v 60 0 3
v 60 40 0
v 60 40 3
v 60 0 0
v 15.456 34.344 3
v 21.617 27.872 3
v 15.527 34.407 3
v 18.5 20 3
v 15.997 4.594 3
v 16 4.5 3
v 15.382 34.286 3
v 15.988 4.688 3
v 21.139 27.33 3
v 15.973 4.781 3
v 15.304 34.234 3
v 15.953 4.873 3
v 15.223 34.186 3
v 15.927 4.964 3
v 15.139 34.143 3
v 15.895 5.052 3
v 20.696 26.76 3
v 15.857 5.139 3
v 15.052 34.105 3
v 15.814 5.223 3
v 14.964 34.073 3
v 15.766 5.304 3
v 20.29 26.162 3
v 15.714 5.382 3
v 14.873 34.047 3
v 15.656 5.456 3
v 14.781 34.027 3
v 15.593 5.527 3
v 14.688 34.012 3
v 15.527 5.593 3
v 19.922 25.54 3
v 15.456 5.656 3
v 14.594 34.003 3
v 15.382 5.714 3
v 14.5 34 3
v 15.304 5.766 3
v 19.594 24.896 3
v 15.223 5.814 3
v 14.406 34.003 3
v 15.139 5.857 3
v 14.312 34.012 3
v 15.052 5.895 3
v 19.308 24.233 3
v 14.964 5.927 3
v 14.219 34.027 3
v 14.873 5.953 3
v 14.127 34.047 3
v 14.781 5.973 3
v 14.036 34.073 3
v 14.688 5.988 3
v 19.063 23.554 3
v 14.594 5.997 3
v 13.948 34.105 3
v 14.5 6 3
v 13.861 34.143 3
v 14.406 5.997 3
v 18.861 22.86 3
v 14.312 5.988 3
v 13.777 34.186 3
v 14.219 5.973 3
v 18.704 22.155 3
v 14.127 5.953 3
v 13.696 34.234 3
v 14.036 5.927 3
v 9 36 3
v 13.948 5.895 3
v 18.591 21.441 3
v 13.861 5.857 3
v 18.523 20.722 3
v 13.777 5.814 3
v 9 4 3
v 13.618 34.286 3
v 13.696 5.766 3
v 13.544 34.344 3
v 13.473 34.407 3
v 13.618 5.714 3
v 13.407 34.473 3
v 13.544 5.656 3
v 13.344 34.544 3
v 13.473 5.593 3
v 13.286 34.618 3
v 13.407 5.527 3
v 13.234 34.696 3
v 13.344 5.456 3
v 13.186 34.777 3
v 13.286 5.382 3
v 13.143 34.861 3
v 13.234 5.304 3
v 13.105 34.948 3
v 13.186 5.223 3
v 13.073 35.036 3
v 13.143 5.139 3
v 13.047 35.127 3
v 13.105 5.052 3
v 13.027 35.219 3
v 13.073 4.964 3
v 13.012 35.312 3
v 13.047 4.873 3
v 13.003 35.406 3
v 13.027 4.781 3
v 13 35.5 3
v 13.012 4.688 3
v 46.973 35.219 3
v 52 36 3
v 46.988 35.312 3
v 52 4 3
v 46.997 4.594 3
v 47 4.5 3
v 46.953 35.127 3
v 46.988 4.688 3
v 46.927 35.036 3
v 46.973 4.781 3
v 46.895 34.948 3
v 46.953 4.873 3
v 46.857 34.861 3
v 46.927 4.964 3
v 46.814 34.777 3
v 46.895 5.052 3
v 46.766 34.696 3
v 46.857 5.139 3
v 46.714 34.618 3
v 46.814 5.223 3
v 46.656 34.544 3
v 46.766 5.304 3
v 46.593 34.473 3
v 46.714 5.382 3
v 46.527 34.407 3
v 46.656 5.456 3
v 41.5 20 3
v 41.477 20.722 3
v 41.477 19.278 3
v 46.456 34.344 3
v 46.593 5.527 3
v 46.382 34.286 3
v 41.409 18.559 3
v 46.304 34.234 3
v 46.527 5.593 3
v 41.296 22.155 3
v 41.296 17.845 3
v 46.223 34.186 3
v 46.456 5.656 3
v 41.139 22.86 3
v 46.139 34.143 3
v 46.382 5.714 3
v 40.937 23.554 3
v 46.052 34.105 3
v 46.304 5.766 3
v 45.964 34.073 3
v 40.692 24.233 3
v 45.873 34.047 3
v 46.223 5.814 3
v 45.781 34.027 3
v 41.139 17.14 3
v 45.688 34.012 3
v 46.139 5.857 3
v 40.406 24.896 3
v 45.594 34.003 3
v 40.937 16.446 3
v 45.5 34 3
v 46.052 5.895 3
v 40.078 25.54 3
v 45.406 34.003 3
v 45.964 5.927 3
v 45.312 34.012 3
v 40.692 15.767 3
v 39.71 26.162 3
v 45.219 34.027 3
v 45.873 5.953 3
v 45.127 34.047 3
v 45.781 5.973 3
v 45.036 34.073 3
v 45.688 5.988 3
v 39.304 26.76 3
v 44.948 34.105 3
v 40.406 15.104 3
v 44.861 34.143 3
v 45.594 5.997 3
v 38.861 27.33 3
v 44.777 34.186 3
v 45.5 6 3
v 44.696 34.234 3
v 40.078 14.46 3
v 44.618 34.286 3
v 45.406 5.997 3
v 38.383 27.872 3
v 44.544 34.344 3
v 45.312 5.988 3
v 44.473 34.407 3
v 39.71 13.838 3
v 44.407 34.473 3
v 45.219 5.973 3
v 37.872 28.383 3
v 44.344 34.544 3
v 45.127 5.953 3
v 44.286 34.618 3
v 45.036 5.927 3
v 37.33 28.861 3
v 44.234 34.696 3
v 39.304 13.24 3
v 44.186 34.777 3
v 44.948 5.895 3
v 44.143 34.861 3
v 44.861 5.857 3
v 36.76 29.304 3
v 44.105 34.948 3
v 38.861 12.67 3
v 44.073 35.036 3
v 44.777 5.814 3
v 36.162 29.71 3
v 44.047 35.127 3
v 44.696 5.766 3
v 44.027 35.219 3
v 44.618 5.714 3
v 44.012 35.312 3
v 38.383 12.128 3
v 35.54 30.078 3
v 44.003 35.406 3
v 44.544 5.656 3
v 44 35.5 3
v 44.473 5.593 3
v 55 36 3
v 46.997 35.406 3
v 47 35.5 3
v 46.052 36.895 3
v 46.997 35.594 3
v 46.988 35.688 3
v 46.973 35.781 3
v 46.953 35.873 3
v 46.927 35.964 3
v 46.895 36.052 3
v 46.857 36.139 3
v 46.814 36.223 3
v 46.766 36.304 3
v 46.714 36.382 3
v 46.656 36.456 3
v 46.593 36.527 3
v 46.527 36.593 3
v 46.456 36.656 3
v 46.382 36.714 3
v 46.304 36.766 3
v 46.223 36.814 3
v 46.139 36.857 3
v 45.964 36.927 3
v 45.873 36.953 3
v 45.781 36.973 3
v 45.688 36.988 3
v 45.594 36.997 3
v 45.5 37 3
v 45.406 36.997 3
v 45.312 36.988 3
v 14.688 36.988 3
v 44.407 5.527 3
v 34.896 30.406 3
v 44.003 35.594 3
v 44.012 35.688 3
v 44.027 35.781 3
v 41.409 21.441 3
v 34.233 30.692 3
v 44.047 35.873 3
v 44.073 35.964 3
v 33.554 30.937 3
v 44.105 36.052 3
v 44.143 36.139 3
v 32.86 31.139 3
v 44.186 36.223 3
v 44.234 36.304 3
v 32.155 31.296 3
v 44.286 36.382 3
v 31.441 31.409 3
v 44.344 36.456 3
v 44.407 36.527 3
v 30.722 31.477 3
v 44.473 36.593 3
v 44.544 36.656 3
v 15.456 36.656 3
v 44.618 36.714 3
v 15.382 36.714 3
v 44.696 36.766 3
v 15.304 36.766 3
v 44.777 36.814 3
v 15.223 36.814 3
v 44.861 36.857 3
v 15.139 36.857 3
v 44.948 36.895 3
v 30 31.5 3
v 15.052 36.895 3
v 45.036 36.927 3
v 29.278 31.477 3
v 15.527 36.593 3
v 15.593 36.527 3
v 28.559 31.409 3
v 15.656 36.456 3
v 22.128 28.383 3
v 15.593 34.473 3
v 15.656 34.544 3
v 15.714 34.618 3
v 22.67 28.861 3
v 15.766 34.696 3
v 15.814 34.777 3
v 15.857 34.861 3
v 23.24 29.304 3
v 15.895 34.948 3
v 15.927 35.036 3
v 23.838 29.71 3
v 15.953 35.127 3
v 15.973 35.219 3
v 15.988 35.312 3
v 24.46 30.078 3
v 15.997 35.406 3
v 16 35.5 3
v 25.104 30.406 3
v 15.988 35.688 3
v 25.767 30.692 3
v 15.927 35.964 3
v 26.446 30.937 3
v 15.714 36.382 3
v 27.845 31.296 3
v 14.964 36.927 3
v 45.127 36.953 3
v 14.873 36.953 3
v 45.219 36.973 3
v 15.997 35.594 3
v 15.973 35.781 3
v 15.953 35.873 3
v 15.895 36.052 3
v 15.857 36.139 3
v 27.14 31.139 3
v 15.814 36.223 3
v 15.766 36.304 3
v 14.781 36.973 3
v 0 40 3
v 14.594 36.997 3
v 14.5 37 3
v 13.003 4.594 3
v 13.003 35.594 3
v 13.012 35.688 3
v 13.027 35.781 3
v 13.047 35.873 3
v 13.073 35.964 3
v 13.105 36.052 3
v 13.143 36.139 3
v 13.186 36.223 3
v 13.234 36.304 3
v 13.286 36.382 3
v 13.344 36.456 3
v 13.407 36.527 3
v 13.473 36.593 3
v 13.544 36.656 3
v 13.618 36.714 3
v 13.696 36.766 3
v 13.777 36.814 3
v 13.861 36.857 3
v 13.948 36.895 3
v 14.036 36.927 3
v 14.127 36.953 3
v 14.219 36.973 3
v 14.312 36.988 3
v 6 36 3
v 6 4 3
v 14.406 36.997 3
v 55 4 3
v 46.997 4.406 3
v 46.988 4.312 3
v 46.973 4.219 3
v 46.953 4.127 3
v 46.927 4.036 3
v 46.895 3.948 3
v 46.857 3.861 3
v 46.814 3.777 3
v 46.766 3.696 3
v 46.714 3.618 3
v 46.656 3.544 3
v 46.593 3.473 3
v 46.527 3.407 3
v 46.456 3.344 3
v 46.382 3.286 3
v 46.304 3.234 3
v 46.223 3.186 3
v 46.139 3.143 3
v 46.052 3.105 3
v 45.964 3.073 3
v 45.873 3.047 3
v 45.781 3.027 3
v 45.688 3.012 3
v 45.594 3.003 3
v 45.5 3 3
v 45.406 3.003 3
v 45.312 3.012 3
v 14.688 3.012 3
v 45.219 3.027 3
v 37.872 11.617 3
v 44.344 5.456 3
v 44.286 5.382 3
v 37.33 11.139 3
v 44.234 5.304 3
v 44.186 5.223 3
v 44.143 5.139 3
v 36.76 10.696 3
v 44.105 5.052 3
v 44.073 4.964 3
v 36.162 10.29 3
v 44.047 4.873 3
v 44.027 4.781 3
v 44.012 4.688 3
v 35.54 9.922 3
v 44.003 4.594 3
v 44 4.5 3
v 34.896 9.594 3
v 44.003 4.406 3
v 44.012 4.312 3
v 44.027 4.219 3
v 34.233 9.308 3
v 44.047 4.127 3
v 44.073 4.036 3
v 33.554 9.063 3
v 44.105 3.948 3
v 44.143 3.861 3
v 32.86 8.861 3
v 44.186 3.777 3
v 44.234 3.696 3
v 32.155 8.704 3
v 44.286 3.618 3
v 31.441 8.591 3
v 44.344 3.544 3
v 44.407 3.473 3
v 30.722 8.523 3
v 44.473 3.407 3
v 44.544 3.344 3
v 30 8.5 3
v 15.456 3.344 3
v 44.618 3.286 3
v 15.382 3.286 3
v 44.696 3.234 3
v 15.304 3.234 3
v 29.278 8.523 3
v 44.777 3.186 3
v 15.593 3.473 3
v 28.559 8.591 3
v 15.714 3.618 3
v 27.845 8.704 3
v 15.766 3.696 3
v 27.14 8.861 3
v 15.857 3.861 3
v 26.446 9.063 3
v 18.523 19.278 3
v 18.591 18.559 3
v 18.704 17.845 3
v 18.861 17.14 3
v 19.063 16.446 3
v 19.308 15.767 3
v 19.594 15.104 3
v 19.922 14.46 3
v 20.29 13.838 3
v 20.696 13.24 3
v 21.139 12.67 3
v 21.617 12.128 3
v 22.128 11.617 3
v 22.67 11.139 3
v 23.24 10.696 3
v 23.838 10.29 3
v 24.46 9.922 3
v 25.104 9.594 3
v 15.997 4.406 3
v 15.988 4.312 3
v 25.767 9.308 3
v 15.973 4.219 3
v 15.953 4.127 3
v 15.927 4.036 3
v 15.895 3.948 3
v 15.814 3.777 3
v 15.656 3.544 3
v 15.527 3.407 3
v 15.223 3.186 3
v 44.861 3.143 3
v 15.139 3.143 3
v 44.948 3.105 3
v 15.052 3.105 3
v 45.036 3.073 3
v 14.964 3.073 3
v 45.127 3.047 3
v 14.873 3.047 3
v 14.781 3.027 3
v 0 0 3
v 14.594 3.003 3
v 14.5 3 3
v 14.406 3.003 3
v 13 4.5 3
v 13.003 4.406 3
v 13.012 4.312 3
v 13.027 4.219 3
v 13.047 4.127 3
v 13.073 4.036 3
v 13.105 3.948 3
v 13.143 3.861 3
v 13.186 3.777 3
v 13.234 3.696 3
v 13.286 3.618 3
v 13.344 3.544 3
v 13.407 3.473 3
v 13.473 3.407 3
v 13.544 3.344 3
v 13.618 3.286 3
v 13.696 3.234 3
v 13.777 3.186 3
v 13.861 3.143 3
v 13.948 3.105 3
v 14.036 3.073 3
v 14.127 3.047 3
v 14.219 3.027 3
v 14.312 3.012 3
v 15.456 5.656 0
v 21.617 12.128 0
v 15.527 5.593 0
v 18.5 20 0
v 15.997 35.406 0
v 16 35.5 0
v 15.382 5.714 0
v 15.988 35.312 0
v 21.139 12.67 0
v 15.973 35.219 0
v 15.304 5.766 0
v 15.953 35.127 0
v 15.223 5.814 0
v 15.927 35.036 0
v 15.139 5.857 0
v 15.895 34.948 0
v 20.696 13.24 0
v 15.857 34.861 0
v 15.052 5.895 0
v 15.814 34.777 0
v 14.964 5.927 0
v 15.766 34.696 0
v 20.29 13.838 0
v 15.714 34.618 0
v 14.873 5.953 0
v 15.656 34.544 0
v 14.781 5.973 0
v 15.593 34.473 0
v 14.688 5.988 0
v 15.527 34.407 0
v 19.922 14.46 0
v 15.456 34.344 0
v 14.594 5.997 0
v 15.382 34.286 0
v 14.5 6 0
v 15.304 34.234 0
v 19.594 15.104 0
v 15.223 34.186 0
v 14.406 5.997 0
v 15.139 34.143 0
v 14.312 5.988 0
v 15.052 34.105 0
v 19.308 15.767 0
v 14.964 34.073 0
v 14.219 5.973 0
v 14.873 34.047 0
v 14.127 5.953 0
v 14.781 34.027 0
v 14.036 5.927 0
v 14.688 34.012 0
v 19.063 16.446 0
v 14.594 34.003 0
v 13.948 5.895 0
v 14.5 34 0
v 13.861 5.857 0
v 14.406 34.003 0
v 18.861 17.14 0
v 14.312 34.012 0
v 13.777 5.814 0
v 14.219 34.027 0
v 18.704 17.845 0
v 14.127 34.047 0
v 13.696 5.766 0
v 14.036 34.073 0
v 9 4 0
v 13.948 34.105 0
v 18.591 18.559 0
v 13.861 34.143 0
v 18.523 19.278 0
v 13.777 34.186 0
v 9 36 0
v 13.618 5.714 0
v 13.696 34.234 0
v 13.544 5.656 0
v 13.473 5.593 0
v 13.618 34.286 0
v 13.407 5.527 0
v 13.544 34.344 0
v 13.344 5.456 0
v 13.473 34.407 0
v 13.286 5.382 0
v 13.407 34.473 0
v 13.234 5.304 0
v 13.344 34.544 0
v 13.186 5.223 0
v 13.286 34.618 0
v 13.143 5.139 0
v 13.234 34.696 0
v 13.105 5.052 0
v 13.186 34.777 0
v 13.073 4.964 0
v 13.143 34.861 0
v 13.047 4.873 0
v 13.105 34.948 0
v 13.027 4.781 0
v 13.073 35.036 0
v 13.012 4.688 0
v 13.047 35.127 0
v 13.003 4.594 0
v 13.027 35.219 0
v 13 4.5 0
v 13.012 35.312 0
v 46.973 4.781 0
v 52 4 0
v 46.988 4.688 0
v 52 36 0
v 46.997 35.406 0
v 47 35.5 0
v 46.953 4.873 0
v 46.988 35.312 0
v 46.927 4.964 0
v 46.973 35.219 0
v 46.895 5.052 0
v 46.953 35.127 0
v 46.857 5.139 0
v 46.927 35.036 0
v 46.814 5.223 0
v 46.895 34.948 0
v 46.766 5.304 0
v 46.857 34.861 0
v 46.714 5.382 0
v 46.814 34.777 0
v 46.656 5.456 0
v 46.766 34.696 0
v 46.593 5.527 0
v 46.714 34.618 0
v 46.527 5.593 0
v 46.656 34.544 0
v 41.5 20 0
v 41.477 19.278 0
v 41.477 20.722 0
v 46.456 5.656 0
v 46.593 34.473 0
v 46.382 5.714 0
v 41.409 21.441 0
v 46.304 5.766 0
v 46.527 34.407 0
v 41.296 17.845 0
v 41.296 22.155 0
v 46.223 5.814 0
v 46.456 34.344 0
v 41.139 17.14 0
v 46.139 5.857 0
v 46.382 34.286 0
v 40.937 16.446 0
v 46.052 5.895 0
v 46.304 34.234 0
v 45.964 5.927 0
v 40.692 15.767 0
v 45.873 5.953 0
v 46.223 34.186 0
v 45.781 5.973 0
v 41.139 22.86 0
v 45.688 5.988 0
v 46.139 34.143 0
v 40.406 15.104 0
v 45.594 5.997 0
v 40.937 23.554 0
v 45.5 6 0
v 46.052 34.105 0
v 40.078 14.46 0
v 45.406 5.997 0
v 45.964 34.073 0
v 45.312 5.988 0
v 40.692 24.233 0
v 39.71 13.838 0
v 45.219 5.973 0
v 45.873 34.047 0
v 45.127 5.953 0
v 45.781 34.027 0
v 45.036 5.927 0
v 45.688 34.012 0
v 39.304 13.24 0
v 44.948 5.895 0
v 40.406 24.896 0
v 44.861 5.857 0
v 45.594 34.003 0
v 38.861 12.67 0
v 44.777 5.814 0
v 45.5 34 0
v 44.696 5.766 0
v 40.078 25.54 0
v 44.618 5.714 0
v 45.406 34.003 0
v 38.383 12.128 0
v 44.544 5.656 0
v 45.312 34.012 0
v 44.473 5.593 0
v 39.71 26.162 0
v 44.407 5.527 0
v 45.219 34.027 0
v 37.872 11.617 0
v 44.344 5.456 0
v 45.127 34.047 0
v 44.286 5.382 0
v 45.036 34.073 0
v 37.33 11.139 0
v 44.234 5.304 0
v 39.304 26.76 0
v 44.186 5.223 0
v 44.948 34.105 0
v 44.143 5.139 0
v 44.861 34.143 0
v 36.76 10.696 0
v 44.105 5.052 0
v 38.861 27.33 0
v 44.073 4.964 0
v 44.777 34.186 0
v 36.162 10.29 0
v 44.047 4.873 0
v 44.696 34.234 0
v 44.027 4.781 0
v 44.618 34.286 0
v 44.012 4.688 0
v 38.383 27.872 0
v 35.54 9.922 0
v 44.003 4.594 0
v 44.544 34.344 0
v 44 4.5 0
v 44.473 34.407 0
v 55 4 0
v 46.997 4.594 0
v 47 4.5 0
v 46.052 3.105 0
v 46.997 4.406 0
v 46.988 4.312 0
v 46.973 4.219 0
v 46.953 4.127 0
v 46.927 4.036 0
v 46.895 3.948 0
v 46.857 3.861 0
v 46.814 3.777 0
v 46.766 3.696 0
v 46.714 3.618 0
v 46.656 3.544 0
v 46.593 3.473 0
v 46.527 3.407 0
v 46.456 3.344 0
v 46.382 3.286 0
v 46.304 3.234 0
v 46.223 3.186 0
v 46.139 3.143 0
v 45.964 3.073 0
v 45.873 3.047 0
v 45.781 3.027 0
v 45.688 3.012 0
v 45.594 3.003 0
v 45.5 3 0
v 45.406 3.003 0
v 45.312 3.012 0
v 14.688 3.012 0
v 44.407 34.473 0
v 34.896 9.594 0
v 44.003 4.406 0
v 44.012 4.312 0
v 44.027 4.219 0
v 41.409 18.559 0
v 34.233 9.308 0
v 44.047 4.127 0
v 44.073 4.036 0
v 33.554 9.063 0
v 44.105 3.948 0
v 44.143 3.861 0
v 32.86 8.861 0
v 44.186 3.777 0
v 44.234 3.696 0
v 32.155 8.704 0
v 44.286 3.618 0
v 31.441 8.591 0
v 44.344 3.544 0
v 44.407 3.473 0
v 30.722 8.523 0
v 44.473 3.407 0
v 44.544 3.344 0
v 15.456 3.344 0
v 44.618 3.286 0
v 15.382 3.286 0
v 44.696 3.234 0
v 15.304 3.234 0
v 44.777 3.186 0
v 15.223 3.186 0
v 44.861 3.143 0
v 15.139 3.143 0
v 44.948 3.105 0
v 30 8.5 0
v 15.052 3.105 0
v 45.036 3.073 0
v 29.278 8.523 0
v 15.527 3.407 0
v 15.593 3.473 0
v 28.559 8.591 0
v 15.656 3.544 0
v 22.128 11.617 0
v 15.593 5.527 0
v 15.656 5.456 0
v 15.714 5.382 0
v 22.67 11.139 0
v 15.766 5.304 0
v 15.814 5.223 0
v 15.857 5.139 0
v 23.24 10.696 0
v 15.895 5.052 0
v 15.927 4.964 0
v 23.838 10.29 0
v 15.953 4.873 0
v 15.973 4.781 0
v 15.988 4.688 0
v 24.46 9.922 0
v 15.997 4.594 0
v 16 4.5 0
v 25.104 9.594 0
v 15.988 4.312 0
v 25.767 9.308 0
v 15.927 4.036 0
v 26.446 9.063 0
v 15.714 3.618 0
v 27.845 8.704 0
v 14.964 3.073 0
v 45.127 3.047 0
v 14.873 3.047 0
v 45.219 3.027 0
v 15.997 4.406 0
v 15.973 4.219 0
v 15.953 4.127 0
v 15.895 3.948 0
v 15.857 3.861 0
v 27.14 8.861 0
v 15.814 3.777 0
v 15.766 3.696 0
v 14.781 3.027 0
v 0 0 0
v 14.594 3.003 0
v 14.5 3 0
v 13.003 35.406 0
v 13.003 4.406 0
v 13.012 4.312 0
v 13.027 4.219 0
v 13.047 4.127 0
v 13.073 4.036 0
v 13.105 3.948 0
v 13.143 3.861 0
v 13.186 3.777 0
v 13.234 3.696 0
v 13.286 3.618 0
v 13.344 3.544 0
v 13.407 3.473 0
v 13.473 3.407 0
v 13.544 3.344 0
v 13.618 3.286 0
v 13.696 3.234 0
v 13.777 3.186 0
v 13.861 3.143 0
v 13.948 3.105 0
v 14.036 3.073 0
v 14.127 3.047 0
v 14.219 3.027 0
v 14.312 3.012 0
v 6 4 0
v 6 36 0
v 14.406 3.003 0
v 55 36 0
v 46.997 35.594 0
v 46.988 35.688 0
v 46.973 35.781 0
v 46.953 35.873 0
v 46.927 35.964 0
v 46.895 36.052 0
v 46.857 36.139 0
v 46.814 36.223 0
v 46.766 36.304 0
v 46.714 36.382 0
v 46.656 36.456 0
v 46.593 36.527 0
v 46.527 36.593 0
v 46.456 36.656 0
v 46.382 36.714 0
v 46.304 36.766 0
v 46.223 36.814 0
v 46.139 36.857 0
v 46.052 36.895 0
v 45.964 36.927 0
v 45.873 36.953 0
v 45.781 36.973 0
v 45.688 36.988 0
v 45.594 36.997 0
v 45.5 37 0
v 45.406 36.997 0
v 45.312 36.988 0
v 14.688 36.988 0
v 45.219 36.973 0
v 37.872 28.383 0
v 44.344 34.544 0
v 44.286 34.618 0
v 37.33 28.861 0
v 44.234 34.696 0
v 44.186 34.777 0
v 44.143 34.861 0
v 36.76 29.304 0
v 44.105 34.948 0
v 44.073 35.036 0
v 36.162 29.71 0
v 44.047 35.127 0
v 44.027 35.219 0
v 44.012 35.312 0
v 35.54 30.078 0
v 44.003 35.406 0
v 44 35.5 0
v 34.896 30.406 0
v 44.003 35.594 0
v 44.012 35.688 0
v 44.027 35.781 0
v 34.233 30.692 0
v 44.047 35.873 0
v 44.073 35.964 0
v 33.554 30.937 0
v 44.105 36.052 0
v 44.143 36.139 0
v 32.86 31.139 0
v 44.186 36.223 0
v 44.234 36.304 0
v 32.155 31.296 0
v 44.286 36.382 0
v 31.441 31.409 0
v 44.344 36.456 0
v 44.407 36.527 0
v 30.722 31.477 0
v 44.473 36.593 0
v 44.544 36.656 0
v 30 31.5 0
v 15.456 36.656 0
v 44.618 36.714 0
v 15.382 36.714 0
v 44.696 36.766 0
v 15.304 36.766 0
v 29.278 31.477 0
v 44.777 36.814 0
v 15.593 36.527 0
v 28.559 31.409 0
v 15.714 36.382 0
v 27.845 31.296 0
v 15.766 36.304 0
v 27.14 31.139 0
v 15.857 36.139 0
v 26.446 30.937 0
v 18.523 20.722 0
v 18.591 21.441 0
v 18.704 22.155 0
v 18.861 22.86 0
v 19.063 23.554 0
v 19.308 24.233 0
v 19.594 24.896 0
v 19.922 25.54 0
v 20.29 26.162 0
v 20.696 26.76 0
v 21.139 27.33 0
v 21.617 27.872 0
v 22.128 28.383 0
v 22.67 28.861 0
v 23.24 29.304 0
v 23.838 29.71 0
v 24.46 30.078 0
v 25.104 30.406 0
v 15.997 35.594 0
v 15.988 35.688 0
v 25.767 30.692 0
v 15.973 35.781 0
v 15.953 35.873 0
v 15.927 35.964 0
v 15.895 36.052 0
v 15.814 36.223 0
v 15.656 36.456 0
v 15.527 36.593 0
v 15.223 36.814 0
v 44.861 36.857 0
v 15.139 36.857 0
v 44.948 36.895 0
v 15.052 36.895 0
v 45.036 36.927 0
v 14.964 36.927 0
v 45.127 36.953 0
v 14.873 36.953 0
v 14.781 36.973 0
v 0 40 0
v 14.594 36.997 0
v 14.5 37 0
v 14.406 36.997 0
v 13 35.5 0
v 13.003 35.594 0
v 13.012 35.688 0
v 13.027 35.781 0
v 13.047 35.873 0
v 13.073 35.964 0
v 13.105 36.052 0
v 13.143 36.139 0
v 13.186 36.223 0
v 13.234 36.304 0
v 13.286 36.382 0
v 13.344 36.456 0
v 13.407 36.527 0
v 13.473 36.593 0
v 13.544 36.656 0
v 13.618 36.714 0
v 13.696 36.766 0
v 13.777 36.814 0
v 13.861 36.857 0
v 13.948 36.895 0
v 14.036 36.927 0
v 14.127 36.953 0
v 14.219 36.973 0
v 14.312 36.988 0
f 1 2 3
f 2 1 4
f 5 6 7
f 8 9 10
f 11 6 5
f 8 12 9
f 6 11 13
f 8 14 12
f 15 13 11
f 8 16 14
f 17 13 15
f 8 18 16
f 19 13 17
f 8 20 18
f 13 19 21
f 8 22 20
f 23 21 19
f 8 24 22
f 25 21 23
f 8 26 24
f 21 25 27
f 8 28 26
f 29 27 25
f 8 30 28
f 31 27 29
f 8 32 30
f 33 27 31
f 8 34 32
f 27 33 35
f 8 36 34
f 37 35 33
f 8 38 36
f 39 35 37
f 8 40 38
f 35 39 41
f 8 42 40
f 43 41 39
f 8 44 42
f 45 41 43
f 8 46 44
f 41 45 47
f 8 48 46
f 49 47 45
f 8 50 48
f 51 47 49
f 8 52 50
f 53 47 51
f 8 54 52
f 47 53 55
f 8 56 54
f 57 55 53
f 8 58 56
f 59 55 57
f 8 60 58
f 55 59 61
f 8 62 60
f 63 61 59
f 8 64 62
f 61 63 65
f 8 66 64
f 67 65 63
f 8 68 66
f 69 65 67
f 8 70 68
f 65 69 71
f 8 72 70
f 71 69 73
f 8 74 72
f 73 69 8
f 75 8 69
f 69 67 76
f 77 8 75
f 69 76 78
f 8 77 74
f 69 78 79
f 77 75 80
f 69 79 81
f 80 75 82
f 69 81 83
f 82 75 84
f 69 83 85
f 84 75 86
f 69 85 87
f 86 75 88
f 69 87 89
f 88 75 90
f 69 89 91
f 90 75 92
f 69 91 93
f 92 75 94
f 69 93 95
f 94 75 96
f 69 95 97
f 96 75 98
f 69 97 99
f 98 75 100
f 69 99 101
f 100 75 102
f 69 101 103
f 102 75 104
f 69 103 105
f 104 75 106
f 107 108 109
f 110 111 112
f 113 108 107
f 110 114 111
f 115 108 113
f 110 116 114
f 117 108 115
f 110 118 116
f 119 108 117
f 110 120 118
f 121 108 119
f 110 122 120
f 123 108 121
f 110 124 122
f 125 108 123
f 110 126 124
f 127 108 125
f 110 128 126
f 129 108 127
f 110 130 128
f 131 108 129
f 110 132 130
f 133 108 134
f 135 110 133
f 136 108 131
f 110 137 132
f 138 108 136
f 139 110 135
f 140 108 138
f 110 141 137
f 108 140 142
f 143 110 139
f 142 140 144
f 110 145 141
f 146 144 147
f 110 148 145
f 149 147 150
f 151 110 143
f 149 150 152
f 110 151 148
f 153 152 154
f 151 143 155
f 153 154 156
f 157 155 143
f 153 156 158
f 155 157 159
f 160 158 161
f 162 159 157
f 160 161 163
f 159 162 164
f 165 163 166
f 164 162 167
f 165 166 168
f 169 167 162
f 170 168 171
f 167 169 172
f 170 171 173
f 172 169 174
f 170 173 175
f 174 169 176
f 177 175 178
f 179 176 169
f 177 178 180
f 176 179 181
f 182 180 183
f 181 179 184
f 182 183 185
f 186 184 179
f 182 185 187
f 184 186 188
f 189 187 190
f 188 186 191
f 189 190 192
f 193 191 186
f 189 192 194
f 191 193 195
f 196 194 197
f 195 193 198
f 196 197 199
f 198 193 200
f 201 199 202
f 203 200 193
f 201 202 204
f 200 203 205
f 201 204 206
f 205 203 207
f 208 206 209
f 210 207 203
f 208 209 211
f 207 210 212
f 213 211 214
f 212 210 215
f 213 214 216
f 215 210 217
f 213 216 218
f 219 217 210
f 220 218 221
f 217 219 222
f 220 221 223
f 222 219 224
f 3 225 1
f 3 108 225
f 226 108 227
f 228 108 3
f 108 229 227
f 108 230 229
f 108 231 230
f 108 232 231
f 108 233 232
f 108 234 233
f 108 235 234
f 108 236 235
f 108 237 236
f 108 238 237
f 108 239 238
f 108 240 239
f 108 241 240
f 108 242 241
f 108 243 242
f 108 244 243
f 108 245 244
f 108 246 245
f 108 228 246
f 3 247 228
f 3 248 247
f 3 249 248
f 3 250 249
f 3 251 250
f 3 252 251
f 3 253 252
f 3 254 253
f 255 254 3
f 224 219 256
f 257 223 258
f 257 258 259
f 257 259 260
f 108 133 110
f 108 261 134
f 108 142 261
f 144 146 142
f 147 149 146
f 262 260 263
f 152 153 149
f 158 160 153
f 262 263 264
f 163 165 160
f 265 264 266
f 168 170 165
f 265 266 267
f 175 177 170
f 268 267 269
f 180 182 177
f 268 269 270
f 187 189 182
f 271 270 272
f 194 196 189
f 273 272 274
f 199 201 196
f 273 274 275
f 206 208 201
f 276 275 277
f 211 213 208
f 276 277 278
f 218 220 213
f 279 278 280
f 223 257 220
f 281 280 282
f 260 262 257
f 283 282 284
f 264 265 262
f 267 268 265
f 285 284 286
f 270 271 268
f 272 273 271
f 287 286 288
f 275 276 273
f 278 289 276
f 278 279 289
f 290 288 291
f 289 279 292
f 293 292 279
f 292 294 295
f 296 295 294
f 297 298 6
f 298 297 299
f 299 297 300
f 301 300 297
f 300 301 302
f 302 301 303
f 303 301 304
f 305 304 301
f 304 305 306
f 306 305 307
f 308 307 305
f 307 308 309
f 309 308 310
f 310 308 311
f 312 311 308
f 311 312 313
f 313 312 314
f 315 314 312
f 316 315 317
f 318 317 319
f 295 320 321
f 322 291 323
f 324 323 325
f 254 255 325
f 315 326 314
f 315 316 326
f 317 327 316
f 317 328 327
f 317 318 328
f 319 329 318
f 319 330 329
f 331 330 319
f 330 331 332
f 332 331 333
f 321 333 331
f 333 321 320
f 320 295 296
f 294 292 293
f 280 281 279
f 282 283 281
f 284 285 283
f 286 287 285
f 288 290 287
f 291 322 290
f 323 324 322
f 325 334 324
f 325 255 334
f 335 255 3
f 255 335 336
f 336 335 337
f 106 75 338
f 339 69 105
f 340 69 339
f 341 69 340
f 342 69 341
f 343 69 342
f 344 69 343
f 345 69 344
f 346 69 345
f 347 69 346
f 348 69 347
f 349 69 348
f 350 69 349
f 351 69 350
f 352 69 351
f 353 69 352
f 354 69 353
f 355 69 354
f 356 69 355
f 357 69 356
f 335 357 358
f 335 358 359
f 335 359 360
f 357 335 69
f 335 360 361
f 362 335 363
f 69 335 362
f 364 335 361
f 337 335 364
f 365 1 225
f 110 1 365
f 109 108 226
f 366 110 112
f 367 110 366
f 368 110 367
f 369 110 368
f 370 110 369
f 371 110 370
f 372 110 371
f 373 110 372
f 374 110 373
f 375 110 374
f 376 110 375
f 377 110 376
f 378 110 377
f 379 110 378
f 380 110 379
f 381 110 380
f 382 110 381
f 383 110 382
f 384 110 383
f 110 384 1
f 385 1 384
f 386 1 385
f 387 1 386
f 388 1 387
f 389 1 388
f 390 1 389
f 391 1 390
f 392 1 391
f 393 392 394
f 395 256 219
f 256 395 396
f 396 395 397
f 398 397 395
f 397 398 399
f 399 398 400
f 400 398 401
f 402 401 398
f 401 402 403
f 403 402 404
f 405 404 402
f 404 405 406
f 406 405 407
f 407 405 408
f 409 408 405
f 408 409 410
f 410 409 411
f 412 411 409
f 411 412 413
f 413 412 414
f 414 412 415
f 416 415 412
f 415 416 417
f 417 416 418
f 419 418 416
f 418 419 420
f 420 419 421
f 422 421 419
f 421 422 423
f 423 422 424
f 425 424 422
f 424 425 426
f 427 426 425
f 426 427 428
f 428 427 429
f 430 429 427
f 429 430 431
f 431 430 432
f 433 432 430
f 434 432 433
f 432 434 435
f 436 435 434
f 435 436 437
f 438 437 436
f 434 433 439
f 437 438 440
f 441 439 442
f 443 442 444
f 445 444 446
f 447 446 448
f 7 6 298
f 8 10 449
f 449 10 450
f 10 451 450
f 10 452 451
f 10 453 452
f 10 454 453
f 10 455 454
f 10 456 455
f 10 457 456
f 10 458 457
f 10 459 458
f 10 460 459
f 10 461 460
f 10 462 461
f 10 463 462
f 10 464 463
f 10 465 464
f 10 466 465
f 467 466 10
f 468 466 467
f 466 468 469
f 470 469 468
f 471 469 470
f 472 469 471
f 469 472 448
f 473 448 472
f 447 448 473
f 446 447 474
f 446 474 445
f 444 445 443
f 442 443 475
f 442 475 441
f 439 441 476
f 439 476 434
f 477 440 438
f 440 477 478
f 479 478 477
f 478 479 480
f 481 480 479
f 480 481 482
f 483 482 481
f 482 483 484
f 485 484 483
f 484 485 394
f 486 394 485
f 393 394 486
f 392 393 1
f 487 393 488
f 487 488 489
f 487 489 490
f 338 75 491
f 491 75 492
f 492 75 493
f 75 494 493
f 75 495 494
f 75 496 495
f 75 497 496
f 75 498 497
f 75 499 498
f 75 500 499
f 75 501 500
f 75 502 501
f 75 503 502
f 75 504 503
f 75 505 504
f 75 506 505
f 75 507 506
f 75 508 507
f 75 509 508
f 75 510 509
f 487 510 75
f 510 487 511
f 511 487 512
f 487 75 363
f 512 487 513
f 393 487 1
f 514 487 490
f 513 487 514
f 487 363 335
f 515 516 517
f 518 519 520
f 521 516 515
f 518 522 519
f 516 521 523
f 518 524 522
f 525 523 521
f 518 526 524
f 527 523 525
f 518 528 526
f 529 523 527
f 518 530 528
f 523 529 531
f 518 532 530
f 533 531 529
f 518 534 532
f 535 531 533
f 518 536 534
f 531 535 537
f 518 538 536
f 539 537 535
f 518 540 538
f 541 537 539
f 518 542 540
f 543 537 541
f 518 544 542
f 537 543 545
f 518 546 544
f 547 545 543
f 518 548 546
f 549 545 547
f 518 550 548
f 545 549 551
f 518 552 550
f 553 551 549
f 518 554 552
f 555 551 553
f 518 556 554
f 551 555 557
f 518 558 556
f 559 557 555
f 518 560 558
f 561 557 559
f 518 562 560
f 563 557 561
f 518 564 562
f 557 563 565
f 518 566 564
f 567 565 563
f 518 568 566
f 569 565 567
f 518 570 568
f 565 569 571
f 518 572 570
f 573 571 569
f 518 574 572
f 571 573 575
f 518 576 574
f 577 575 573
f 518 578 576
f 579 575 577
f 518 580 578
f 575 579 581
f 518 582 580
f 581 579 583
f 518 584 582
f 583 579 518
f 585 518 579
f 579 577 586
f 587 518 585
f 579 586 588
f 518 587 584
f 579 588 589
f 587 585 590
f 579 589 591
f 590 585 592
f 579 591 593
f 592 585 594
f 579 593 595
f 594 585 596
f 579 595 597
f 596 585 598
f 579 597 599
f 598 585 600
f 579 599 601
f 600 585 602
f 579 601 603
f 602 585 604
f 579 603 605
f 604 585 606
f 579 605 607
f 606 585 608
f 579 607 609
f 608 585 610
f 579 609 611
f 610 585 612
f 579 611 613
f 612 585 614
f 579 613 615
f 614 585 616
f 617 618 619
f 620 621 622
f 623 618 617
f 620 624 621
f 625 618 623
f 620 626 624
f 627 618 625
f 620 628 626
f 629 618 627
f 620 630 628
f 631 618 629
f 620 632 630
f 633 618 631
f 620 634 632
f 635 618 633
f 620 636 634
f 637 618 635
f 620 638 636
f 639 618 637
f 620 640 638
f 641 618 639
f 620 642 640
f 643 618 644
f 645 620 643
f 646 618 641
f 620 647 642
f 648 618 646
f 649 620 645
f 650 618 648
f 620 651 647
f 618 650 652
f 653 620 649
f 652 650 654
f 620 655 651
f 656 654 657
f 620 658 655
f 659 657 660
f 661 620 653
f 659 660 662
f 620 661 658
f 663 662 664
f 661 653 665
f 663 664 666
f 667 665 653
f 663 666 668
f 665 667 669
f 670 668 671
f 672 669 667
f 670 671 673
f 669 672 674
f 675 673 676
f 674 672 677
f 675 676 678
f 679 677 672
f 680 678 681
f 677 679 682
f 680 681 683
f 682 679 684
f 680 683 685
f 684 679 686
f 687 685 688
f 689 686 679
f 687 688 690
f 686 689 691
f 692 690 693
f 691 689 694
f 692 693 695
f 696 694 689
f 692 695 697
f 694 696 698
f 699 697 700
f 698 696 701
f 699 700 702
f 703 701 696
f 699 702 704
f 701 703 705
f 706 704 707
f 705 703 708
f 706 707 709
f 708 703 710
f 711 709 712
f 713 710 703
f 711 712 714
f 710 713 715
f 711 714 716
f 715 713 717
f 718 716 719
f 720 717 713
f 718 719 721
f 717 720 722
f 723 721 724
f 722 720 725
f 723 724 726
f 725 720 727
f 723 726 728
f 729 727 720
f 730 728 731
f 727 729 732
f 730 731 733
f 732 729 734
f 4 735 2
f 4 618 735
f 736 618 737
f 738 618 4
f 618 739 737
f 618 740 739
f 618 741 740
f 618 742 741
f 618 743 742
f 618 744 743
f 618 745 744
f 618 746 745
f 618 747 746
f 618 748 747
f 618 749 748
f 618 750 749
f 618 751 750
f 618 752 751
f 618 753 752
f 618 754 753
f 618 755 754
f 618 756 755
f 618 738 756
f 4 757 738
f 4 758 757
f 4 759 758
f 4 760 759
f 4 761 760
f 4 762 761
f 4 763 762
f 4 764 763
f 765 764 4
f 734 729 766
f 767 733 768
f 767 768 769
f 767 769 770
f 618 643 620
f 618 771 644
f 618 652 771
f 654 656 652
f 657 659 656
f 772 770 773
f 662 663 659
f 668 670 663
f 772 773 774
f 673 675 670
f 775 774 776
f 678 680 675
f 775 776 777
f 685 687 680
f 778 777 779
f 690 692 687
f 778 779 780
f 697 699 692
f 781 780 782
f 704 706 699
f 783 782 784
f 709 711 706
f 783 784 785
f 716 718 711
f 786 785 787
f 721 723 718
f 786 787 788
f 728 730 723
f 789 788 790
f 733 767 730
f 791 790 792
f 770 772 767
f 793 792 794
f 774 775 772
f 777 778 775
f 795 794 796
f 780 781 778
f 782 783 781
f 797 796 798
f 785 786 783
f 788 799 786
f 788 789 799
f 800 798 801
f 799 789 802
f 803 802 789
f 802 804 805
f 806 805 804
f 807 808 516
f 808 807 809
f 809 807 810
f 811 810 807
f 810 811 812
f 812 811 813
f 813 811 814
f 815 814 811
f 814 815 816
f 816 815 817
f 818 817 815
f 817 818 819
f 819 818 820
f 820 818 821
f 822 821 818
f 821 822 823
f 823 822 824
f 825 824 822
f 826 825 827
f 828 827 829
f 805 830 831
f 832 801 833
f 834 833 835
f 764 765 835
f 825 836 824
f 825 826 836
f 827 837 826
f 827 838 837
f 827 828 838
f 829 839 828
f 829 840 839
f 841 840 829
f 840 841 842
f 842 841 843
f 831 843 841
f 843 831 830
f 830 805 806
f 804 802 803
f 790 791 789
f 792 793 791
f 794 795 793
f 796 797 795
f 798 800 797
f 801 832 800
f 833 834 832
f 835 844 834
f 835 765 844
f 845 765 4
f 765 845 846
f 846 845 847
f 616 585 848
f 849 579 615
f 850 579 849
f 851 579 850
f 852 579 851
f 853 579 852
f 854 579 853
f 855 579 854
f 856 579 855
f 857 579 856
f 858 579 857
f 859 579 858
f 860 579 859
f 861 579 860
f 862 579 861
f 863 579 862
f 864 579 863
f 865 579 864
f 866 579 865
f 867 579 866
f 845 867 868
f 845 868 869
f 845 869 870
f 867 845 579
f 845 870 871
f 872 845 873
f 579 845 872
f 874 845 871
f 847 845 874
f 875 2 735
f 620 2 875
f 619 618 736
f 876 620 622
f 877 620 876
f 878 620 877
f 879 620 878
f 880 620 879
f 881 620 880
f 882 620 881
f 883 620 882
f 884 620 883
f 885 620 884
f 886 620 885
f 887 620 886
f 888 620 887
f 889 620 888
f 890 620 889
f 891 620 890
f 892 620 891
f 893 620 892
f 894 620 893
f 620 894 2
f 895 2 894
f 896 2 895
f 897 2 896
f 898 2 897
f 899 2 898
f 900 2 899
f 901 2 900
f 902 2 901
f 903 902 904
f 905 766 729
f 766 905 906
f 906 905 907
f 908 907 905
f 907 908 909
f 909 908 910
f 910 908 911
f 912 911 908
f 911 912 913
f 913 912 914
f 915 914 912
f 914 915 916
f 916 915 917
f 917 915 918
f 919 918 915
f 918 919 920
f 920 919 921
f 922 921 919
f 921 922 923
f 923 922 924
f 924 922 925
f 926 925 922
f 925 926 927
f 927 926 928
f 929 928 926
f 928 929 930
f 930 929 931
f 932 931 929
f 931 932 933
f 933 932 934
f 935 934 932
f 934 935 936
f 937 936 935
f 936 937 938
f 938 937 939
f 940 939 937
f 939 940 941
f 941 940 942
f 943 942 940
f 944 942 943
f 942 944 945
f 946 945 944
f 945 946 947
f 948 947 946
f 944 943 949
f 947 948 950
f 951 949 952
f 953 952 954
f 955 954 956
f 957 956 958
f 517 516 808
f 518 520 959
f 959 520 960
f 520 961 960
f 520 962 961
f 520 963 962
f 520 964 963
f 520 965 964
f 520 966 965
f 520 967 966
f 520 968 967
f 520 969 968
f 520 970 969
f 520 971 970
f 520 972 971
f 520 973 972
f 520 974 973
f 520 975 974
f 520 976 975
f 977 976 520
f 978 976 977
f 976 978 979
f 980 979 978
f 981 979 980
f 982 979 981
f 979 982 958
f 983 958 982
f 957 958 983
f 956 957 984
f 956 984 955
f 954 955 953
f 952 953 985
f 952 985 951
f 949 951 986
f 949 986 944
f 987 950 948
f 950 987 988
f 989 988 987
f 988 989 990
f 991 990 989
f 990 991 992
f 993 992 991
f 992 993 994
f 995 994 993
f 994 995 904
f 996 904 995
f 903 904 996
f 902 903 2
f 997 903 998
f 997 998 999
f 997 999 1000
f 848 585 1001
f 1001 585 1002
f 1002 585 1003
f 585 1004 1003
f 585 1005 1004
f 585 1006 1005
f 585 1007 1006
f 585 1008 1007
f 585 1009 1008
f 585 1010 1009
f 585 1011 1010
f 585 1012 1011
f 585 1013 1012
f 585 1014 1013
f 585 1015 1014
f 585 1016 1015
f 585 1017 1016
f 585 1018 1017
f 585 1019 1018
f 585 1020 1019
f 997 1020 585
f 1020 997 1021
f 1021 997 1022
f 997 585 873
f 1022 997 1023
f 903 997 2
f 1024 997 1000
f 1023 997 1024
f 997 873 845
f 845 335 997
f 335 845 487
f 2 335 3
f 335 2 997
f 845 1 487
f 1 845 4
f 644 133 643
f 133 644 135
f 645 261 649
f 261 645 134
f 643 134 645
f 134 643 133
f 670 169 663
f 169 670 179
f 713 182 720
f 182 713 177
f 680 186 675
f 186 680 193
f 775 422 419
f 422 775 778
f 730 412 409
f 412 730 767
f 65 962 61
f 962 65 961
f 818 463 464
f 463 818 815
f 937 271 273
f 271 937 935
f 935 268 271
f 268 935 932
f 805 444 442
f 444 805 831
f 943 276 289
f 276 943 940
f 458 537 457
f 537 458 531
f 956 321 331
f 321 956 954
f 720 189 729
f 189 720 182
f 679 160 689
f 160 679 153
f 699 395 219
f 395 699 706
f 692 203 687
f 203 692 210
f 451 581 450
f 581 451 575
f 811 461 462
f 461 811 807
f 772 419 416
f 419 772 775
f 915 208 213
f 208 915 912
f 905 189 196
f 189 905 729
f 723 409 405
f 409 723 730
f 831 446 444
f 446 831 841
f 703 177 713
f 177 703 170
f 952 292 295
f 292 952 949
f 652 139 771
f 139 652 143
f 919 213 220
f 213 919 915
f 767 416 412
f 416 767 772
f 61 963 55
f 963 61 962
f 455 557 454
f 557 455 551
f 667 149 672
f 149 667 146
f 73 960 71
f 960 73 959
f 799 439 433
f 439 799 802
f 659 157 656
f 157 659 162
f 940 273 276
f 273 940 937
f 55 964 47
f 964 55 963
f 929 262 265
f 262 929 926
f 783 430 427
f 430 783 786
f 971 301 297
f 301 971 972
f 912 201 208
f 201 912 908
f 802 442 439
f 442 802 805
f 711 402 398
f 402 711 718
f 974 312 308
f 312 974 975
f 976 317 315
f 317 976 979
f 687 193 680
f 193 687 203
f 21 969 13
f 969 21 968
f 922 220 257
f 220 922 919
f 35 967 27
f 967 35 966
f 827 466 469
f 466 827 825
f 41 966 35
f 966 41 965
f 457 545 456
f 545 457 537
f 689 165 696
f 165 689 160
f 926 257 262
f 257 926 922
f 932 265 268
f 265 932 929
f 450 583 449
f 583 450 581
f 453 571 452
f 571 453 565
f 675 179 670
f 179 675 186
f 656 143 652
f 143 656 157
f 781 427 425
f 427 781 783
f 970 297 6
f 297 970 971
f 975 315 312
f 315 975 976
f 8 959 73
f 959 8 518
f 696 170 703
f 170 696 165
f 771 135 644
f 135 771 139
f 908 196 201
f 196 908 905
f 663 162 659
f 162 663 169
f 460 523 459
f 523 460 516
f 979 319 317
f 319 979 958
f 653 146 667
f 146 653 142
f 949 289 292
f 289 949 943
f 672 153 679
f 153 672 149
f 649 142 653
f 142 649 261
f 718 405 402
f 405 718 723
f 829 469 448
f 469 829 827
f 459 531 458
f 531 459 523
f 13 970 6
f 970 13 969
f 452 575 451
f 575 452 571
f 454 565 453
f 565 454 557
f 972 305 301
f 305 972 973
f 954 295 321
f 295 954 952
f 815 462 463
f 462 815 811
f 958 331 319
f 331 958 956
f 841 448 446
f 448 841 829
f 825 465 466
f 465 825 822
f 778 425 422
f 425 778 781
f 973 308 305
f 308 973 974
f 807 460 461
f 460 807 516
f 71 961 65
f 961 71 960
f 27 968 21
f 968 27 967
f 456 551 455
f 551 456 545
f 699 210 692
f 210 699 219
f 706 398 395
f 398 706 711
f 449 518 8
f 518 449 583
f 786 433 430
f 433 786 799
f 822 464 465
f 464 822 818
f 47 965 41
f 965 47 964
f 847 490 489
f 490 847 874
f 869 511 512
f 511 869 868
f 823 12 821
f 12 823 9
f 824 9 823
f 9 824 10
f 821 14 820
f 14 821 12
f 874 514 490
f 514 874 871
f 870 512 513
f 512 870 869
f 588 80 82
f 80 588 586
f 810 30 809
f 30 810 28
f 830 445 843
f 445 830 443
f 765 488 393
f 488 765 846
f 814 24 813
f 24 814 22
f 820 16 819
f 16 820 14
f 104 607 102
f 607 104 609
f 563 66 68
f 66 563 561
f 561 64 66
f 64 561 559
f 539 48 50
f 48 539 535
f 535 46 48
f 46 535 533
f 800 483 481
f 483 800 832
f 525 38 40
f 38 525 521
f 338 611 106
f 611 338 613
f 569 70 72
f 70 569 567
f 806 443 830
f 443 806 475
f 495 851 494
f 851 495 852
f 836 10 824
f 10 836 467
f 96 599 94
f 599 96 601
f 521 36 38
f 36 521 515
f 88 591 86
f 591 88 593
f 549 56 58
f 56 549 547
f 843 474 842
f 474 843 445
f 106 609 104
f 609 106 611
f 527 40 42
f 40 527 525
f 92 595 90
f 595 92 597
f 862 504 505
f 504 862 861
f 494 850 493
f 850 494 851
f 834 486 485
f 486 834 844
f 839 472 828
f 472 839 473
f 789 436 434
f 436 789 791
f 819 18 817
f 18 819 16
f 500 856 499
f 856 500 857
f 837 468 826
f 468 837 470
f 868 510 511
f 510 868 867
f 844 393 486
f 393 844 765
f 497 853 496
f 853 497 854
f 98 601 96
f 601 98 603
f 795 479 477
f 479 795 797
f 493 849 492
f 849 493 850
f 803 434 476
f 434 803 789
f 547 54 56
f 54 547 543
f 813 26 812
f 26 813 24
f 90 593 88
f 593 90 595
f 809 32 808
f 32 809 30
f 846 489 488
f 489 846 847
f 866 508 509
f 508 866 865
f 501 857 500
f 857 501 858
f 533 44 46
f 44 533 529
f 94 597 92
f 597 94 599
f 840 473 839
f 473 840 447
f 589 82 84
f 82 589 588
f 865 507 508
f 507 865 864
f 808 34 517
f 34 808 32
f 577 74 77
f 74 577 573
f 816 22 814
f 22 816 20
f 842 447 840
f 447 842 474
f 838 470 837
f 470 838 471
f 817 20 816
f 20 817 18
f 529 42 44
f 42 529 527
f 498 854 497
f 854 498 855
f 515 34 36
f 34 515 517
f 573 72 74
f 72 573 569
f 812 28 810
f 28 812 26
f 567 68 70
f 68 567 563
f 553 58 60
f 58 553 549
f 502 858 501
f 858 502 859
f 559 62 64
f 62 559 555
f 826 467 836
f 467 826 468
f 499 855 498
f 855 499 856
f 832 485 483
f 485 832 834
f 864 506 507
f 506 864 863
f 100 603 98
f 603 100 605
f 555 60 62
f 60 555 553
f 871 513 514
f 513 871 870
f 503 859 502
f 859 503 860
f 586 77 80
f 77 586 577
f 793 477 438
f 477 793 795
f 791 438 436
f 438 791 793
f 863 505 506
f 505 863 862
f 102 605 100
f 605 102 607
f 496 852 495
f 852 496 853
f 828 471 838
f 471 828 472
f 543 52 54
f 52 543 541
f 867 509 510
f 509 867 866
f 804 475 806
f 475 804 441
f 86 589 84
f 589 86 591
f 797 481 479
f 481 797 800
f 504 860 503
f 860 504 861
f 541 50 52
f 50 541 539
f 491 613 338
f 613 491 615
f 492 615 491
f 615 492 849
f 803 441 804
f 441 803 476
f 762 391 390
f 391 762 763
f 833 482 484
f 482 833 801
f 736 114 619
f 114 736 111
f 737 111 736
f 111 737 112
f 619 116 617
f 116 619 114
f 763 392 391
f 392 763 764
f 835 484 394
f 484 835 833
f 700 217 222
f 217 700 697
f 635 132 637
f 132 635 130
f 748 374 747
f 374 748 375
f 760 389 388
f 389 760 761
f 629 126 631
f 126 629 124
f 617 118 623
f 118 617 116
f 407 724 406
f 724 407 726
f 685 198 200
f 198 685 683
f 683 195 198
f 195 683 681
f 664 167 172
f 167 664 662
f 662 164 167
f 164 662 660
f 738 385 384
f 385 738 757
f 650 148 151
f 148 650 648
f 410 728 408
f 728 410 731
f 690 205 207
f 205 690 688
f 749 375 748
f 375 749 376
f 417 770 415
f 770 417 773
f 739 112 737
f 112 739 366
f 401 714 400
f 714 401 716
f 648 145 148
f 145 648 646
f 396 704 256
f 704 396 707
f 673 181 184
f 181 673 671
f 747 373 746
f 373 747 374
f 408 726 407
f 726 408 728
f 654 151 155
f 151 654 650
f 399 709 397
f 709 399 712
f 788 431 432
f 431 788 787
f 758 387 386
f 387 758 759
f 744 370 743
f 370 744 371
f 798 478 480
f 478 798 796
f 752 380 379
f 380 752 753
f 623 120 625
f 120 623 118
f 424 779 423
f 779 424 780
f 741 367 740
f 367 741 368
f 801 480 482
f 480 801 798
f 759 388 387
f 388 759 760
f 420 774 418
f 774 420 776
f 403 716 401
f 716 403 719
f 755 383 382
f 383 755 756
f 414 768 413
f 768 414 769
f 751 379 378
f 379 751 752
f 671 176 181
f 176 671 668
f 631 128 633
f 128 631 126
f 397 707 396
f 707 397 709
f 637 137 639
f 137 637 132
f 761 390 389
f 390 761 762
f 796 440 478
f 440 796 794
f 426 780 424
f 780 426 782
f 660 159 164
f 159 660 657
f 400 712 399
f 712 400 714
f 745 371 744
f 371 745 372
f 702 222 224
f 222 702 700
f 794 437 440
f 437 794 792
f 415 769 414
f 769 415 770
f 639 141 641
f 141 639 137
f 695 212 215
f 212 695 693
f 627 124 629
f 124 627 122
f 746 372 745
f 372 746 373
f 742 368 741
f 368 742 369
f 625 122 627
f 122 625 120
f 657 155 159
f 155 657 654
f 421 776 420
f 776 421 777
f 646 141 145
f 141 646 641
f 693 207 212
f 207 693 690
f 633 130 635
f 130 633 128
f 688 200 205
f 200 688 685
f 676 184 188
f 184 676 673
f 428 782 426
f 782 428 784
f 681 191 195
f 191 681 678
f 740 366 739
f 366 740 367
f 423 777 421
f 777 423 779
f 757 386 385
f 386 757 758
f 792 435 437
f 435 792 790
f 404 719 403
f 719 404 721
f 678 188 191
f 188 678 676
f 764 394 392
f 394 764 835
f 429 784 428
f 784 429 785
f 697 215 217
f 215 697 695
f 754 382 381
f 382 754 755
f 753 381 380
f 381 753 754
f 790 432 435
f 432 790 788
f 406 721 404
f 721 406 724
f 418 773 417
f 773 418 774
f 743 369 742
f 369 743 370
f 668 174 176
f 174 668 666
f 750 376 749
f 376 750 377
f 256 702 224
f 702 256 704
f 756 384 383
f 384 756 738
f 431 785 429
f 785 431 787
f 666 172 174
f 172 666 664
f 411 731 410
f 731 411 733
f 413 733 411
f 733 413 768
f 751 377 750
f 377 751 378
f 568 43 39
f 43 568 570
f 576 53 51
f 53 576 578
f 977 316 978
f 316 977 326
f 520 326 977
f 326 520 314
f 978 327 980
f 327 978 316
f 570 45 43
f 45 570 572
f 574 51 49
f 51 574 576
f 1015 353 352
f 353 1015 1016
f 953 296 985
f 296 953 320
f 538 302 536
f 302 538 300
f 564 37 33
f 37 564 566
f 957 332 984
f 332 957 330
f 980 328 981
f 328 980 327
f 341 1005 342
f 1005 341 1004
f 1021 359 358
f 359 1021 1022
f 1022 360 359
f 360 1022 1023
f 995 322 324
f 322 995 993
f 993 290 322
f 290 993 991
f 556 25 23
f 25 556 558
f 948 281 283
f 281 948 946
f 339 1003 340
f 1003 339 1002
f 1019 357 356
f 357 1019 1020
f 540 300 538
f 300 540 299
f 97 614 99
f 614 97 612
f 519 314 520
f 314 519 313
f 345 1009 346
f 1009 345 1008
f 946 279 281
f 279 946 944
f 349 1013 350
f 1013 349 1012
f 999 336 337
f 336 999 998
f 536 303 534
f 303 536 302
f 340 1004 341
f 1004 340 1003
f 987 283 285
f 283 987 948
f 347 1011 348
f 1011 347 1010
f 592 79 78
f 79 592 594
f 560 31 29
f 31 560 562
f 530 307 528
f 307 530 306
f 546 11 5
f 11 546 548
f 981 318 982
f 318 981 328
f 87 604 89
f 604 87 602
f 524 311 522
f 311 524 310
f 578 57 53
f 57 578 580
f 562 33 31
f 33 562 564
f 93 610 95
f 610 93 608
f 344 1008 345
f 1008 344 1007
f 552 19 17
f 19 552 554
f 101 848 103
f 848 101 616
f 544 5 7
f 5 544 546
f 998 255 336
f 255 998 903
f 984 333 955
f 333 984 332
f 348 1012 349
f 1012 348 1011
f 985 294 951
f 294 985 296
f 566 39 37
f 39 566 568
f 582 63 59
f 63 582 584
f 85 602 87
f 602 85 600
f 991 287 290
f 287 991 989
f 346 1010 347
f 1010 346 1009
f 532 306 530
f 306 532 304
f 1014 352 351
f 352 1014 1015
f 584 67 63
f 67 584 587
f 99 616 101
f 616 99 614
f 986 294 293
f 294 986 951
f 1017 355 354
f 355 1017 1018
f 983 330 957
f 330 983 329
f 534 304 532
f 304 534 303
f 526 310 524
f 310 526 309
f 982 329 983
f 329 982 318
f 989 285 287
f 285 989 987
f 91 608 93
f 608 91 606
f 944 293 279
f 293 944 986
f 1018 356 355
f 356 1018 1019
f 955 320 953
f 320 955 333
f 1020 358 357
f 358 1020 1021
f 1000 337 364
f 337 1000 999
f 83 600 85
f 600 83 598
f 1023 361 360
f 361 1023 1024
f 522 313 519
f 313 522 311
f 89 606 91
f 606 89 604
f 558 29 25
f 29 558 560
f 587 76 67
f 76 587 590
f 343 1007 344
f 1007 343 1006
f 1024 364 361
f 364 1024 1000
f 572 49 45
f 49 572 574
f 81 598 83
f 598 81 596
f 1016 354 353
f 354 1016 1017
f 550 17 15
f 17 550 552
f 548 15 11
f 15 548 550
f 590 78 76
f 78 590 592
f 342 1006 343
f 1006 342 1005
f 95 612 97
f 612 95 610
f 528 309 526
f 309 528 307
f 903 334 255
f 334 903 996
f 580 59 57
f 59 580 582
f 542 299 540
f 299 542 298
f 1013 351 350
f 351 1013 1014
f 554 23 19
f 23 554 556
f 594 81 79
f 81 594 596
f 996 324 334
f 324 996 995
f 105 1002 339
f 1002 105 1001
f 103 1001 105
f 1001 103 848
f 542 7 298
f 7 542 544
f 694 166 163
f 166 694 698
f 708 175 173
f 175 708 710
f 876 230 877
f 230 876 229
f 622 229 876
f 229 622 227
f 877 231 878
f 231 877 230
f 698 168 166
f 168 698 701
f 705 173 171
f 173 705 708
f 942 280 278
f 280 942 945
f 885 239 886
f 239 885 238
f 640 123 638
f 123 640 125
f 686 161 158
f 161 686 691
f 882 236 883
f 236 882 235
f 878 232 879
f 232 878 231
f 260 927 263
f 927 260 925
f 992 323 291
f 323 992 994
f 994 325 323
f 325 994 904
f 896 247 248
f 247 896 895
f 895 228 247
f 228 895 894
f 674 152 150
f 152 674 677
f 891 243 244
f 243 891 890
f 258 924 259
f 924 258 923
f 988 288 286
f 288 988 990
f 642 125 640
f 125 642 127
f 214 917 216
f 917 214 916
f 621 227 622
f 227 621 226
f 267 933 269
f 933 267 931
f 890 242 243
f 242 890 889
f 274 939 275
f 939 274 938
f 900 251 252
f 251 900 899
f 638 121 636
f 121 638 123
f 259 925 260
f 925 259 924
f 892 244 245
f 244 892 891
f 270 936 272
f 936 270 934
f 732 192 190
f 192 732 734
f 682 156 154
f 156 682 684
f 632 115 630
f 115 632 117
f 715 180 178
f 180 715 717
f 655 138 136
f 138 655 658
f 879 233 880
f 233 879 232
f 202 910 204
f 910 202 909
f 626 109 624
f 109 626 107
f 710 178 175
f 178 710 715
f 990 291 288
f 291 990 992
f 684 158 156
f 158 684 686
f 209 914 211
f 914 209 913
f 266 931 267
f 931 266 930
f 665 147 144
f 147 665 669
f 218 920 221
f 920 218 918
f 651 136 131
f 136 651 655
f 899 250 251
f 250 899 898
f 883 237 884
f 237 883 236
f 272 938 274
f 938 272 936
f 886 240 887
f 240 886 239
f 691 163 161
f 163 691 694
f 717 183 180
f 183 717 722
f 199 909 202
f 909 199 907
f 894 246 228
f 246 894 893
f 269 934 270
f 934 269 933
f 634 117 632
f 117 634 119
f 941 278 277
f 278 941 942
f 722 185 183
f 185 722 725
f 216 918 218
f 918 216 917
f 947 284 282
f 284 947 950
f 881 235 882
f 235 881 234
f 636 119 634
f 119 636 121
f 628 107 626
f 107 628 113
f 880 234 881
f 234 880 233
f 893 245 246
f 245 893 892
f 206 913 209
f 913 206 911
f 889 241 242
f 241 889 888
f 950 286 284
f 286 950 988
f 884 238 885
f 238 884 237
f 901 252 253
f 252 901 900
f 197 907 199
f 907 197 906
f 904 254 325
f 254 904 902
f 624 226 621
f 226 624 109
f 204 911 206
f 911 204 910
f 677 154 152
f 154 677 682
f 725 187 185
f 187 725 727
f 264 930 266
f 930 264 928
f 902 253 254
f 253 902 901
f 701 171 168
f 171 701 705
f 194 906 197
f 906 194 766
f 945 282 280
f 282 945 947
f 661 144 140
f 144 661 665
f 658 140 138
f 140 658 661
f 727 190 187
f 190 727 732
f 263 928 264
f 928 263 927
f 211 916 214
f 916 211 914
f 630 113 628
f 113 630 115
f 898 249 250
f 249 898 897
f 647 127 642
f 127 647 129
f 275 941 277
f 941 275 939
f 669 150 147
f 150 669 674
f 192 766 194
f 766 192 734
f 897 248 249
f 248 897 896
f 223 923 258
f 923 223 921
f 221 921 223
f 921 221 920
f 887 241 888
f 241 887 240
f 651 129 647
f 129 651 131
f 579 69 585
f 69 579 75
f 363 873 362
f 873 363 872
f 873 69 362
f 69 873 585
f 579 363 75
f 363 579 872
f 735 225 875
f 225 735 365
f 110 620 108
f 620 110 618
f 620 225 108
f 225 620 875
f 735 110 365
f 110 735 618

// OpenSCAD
$fn = 100;

espesor = 3;
ancho = 40; 
largo = 60;
separacionTornillos = 31;


difference(){

//-------------
    difference(){
        cube([largo, ancho, espesor]);
        translate([largo * 0.5, ancho * 0.5, 0])
        cylinder(h = espesor*3, d = 23, center = true); 
    }
//-------------

//-------------
    translate(
        [(largo * 0.5) - (separacionTornillos * 0.5),
        (ancho * 0.5) - (separacionTornillos * 0.5),
        0])
    cylinder(h = 100, d = 3, center = true);
        
    translate(
        [(largo * 0.5) + (separacionTornillos * 0.5),
        (ancho * 0.5) - (separacionTornillos * 0.5),
        0])
    cylinder(h = 100, d = 3, center = true);

    translate(
        [(largo * 0.5) - (separacionTornillos * 0.5),
        (ancho * 0.5) + (separacionTornillos * 0.5),
        0])
    cylinder(h = 100, d = 3, center = true);

    translate(
        [(largo * 0.5) + (separacionTornillos * 0.5),
        (ancho * 0.5) + (separacionTornillos * 0.5),
        0])
    cylinder(h = 100, d = 3, center = true);
//-------------



    translate(
        [6, 
        (ancho * 0.5 - ancho * 0.4),
        0])
    cube([3, ancho * 0.8, 10]);

   



    translate(
        [largo -8, 
        (ancho * 0.5 - ancho * 0.4),
        0])
    cube([3, ancho * 0.8, 10]);
    
  
}
